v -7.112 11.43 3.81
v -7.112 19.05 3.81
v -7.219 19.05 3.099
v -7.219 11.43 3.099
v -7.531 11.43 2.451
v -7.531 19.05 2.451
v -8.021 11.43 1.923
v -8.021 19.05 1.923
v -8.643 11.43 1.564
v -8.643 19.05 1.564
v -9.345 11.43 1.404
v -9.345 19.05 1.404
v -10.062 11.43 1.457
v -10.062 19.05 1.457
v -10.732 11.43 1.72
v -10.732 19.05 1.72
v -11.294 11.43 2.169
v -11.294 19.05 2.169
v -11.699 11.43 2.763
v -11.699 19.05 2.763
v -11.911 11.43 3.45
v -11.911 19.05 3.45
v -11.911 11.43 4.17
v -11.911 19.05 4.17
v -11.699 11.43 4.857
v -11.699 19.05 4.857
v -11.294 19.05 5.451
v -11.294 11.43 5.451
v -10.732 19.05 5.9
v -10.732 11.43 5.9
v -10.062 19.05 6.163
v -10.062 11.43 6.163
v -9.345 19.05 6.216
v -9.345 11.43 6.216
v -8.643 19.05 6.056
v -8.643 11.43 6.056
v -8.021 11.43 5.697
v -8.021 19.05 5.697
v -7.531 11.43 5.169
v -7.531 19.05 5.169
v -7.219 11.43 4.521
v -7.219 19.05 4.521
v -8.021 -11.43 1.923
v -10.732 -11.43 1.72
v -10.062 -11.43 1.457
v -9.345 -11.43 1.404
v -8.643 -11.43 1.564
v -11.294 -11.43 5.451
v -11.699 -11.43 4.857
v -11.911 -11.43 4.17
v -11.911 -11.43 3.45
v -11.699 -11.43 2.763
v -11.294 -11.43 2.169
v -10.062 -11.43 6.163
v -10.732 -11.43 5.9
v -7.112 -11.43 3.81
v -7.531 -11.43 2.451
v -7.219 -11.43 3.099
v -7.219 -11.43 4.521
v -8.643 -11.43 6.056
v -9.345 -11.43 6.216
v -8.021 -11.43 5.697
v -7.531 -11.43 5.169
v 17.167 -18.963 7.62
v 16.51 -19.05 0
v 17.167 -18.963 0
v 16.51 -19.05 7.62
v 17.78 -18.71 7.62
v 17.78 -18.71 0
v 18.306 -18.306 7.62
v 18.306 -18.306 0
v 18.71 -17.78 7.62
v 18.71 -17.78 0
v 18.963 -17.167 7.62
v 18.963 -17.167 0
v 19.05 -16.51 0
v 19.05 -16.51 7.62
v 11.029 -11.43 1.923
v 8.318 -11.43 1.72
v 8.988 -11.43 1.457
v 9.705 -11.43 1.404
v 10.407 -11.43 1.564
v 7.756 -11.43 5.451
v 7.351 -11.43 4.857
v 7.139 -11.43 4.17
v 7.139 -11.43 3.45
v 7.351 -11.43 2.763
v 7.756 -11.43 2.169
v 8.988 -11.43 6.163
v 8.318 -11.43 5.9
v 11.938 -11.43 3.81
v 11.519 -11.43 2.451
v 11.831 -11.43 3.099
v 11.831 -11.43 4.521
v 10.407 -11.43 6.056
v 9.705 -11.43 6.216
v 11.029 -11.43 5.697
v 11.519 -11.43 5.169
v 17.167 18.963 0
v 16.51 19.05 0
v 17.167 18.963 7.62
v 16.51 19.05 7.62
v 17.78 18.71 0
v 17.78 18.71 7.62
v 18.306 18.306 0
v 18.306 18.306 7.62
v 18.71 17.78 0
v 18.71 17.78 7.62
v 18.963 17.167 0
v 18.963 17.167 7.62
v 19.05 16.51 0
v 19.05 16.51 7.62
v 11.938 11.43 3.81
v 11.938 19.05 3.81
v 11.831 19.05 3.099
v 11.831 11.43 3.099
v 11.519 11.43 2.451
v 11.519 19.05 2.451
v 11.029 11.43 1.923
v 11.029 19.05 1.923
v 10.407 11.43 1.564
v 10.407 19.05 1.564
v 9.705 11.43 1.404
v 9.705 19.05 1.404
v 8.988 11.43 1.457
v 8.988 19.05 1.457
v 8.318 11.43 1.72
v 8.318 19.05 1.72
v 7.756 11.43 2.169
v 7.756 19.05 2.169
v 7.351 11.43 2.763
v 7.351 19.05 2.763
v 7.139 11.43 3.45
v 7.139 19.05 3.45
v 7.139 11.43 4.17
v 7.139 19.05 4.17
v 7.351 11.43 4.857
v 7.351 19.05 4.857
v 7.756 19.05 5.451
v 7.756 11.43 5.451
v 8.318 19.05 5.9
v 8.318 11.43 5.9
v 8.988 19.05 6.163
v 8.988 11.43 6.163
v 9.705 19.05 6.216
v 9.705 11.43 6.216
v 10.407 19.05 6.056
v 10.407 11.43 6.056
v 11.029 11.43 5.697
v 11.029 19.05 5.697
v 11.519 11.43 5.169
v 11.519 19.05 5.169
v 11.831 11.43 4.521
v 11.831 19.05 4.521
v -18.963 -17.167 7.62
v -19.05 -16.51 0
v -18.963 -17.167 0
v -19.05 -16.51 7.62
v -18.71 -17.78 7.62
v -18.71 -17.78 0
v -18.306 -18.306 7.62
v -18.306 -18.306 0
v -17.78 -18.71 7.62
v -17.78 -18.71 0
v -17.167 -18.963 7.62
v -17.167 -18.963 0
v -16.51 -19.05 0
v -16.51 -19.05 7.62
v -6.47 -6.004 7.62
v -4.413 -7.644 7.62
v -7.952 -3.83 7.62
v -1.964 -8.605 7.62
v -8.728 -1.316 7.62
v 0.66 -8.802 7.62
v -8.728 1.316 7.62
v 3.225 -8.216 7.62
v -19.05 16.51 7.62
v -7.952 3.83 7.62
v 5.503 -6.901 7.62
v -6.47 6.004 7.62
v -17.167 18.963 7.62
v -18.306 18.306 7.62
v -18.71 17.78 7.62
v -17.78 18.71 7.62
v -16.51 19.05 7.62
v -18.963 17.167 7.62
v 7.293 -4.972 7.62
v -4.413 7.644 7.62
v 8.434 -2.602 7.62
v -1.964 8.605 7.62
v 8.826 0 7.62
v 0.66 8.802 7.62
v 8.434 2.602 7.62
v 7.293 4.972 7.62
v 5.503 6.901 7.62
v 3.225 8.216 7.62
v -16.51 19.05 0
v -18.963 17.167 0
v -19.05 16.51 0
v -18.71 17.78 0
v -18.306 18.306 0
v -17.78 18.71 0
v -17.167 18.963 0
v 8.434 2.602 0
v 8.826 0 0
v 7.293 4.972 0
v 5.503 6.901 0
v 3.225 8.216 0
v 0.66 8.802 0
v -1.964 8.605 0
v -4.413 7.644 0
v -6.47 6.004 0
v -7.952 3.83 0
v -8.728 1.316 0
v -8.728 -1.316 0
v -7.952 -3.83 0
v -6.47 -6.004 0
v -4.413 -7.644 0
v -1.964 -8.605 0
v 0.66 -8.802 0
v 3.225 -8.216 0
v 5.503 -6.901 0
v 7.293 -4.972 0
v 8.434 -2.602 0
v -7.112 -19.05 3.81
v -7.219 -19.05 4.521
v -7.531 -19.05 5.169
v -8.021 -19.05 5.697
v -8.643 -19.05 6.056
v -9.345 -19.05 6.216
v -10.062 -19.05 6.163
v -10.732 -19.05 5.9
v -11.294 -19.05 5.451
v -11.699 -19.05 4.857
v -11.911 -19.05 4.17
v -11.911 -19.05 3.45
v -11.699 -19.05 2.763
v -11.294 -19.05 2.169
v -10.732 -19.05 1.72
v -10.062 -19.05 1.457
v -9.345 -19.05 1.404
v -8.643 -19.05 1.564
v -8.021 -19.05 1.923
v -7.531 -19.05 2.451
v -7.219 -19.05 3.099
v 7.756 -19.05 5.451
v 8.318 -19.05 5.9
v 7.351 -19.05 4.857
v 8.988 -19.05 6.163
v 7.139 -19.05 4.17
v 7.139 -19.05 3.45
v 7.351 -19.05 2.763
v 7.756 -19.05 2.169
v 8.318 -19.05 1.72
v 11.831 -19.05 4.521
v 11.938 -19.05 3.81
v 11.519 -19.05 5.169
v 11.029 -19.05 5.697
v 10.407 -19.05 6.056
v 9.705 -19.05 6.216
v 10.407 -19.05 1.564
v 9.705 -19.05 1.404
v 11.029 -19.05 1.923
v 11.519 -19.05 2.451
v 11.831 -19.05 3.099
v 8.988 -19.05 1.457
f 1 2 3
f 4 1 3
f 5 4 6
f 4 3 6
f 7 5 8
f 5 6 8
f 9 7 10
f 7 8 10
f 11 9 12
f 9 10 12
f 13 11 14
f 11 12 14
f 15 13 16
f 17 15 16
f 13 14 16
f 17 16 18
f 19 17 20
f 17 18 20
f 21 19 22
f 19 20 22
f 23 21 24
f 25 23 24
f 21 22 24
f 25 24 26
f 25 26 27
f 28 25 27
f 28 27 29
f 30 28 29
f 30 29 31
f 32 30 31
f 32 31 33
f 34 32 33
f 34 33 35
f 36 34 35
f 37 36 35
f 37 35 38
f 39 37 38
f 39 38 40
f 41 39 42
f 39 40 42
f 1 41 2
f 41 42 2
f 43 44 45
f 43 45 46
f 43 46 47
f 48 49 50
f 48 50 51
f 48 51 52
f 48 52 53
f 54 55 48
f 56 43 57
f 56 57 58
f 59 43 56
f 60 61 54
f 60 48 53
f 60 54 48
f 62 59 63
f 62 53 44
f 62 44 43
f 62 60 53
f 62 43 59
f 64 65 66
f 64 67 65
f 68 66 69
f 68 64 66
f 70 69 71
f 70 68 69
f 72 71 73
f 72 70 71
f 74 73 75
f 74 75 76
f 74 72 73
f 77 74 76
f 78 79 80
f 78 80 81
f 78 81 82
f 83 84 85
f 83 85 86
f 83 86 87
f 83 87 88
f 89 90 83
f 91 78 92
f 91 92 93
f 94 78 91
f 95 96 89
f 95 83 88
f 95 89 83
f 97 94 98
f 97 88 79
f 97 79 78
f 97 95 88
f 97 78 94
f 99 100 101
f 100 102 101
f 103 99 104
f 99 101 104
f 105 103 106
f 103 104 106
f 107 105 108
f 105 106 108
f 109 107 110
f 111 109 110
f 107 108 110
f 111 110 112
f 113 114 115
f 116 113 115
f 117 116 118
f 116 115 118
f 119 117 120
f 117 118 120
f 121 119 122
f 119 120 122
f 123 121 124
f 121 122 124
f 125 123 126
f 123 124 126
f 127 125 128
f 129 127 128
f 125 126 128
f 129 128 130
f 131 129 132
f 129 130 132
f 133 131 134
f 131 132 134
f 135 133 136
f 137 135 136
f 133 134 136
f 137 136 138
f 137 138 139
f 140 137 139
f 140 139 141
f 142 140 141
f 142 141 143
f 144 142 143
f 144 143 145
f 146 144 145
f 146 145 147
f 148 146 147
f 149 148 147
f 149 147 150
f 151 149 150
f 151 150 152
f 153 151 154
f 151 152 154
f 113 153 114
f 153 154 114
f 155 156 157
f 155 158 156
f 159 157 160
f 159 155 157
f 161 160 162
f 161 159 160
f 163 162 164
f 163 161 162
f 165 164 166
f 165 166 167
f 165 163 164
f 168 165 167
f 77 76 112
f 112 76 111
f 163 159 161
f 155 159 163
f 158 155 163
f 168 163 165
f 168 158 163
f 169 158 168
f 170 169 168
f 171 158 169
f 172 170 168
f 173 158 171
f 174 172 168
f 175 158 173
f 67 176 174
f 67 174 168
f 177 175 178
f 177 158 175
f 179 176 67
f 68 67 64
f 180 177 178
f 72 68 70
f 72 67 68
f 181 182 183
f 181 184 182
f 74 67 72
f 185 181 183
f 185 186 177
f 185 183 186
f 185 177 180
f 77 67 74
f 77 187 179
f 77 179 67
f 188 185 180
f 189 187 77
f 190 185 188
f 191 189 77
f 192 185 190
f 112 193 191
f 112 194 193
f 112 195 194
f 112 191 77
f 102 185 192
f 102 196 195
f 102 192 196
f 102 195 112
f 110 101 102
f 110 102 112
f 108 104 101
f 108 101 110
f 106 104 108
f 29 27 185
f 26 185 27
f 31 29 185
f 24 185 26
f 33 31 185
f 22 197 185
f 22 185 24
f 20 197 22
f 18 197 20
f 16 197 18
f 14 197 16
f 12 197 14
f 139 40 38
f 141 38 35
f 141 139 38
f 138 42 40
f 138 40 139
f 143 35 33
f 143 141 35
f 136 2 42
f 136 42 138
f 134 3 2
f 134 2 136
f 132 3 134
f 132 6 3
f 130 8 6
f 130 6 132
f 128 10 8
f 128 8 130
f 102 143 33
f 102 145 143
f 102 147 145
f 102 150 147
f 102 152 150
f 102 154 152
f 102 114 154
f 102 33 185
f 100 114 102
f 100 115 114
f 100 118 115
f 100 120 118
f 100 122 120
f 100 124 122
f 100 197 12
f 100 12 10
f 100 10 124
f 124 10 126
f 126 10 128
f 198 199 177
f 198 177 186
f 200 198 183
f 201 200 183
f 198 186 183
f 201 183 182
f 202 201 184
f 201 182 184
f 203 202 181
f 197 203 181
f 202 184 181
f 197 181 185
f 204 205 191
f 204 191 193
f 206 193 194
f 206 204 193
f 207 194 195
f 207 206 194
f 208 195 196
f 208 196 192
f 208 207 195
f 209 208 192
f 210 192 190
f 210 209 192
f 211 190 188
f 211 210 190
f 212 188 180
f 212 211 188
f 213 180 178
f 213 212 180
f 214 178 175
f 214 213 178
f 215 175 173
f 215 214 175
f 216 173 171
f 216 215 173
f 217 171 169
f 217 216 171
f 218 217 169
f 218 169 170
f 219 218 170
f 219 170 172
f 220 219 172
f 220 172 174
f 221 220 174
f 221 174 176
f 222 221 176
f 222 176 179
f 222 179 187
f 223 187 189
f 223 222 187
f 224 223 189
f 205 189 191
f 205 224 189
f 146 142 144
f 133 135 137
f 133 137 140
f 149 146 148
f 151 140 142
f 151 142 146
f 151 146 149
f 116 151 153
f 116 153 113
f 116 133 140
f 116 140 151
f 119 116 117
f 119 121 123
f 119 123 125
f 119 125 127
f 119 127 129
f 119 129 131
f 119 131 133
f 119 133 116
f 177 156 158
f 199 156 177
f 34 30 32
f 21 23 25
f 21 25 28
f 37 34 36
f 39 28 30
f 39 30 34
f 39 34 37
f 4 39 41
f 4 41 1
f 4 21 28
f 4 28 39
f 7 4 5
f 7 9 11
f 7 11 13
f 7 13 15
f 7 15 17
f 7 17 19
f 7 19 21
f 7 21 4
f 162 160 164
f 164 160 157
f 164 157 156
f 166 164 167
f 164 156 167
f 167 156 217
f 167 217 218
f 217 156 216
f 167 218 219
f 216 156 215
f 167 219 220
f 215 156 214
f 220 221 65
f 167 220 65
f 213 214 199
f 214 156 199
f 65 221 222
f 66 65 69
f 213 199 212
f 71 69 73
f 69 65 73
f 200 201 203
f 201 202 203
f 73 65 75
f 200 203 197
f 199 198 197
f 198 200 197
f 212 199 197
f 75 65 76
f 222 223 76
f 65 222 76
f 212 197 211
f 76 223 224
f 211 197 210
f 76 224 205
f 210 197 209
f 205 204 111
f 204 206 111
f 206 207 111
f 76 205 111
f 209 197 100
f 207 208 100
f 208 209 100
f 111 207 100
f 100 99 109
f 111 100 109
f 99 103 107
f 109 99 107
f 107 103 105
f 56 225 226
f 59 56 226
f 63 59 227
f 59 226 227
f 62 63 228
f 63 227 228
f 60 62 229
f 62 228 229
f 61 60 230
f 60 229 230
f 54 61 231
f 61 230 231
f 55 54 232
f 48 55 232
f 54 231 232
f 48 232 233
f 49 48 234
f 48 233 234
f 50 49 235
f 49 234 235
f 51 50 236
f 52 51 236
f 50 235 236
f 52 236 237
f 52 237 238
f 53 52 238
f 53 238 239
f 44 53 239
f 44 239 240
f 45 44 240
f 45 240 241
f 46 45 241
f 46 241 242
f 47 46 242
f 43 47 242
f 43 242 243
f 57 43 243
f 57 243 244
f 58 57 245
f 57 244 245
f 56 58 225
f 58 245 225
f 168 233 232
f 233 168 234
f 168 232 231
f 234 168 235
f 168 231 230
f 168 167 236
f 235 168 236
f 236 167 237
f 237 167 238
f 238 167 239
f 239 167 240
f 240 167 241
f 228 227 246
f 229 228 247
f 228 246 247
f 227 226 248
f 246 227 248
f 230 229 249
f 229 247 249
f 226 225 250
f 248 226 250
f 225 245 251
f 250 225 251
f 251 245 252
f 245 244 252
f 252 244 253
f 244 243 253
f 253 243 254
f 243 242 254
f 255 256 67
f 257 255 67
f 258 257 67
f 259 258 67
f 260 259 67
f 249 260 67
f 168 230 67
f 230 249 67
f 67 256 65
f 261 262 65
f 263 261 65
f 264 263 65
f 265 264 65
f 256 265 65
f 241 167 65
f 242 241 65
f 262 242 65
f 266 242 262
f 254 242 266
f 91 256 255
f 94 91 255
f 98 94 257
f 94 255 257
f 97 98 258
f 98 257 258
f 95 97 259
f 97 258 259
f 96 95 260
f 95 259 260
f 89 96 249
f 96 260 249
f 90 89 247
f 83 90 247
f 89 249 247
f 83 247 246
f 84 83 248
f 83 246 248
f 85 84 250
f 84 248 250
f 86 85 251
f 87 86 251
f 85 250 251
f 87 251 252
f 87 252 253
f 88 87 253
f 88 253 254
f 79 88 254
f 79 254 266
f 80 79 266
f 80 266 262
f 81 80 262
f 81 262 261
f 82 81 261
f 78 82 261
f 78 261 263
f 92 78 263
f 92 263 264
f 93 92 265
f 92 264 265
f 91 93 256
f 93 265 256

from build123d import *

# Parameters (mm, degrees)
SKETCH1_W           = 38.1
SKETCH1_H           = 38.1
SKETCH1_R           = 8.8265
BOSS_EXTRUDE1_DEPTH = 7.62
FILLET1_R           = 2.54
SKETCH2_R           = 2.413
CUT_EXTRUDE1_DEPTH  = 7.62
SKETCH3_R           = 2.413
CUT_EXTRUDE2_DEPTH  = 7.62


with BuildPart() as part:
    # Sketch1 → Boss-Extrude1 (new body)
    with BuildSketch(Plane.XY):
        Rectangle(SKETCH1_W, SKETCH1_H)
        Circle(SKETCH1_R, mode=Mode.SUBTRACT)
    extrude(amount=BOSS_EXTRUDE1_DEPTH)

    # Fillet1
    fillet1_edges = [part.edges().sort_by_distance(p)[0] for p in [
        (-19.05, 19.05, 3.81),
        (19.05, 19.05, 3.81),
        (19.05, -19.05, 3.81),
        (-19.05, -19.05, 3.81),
    ]]
    fillet(fillet1_edges, radius=FILLET1_R)

    # Sketch2 → Cut-Extrude1 (cut)
    with BuildSketch(Plane.XZ.offset(19.05)):
        with Locations((9.525, 3.81)):
            Circle(SKETCH2_R)
        with Locations((-9.525, 3.81)):
            Circle(SKETCH2_R)
    extrude(amount=-CUT_EXTRUDE1_DEPTH, mode=Mode.SUBTRACT)

    # Sketch3 → Cut-Extrude2 (cut)
    with BuildSketch(Plane(origin=(0, 19.05, 0), x_dir=(1, 0, 0), z_dir=(0, 1, 0))):
        with Locations((-9.525, -3.81)):
            Circle(SKETCH3_R)
        with Locations((9.525, -3.81)):
            Circle(SKETCH3_R)
    extrude(amount=-CUT_EXTRUDE2_DEPTH, mode=Mode.SUBTRACT)


solid = part.part
